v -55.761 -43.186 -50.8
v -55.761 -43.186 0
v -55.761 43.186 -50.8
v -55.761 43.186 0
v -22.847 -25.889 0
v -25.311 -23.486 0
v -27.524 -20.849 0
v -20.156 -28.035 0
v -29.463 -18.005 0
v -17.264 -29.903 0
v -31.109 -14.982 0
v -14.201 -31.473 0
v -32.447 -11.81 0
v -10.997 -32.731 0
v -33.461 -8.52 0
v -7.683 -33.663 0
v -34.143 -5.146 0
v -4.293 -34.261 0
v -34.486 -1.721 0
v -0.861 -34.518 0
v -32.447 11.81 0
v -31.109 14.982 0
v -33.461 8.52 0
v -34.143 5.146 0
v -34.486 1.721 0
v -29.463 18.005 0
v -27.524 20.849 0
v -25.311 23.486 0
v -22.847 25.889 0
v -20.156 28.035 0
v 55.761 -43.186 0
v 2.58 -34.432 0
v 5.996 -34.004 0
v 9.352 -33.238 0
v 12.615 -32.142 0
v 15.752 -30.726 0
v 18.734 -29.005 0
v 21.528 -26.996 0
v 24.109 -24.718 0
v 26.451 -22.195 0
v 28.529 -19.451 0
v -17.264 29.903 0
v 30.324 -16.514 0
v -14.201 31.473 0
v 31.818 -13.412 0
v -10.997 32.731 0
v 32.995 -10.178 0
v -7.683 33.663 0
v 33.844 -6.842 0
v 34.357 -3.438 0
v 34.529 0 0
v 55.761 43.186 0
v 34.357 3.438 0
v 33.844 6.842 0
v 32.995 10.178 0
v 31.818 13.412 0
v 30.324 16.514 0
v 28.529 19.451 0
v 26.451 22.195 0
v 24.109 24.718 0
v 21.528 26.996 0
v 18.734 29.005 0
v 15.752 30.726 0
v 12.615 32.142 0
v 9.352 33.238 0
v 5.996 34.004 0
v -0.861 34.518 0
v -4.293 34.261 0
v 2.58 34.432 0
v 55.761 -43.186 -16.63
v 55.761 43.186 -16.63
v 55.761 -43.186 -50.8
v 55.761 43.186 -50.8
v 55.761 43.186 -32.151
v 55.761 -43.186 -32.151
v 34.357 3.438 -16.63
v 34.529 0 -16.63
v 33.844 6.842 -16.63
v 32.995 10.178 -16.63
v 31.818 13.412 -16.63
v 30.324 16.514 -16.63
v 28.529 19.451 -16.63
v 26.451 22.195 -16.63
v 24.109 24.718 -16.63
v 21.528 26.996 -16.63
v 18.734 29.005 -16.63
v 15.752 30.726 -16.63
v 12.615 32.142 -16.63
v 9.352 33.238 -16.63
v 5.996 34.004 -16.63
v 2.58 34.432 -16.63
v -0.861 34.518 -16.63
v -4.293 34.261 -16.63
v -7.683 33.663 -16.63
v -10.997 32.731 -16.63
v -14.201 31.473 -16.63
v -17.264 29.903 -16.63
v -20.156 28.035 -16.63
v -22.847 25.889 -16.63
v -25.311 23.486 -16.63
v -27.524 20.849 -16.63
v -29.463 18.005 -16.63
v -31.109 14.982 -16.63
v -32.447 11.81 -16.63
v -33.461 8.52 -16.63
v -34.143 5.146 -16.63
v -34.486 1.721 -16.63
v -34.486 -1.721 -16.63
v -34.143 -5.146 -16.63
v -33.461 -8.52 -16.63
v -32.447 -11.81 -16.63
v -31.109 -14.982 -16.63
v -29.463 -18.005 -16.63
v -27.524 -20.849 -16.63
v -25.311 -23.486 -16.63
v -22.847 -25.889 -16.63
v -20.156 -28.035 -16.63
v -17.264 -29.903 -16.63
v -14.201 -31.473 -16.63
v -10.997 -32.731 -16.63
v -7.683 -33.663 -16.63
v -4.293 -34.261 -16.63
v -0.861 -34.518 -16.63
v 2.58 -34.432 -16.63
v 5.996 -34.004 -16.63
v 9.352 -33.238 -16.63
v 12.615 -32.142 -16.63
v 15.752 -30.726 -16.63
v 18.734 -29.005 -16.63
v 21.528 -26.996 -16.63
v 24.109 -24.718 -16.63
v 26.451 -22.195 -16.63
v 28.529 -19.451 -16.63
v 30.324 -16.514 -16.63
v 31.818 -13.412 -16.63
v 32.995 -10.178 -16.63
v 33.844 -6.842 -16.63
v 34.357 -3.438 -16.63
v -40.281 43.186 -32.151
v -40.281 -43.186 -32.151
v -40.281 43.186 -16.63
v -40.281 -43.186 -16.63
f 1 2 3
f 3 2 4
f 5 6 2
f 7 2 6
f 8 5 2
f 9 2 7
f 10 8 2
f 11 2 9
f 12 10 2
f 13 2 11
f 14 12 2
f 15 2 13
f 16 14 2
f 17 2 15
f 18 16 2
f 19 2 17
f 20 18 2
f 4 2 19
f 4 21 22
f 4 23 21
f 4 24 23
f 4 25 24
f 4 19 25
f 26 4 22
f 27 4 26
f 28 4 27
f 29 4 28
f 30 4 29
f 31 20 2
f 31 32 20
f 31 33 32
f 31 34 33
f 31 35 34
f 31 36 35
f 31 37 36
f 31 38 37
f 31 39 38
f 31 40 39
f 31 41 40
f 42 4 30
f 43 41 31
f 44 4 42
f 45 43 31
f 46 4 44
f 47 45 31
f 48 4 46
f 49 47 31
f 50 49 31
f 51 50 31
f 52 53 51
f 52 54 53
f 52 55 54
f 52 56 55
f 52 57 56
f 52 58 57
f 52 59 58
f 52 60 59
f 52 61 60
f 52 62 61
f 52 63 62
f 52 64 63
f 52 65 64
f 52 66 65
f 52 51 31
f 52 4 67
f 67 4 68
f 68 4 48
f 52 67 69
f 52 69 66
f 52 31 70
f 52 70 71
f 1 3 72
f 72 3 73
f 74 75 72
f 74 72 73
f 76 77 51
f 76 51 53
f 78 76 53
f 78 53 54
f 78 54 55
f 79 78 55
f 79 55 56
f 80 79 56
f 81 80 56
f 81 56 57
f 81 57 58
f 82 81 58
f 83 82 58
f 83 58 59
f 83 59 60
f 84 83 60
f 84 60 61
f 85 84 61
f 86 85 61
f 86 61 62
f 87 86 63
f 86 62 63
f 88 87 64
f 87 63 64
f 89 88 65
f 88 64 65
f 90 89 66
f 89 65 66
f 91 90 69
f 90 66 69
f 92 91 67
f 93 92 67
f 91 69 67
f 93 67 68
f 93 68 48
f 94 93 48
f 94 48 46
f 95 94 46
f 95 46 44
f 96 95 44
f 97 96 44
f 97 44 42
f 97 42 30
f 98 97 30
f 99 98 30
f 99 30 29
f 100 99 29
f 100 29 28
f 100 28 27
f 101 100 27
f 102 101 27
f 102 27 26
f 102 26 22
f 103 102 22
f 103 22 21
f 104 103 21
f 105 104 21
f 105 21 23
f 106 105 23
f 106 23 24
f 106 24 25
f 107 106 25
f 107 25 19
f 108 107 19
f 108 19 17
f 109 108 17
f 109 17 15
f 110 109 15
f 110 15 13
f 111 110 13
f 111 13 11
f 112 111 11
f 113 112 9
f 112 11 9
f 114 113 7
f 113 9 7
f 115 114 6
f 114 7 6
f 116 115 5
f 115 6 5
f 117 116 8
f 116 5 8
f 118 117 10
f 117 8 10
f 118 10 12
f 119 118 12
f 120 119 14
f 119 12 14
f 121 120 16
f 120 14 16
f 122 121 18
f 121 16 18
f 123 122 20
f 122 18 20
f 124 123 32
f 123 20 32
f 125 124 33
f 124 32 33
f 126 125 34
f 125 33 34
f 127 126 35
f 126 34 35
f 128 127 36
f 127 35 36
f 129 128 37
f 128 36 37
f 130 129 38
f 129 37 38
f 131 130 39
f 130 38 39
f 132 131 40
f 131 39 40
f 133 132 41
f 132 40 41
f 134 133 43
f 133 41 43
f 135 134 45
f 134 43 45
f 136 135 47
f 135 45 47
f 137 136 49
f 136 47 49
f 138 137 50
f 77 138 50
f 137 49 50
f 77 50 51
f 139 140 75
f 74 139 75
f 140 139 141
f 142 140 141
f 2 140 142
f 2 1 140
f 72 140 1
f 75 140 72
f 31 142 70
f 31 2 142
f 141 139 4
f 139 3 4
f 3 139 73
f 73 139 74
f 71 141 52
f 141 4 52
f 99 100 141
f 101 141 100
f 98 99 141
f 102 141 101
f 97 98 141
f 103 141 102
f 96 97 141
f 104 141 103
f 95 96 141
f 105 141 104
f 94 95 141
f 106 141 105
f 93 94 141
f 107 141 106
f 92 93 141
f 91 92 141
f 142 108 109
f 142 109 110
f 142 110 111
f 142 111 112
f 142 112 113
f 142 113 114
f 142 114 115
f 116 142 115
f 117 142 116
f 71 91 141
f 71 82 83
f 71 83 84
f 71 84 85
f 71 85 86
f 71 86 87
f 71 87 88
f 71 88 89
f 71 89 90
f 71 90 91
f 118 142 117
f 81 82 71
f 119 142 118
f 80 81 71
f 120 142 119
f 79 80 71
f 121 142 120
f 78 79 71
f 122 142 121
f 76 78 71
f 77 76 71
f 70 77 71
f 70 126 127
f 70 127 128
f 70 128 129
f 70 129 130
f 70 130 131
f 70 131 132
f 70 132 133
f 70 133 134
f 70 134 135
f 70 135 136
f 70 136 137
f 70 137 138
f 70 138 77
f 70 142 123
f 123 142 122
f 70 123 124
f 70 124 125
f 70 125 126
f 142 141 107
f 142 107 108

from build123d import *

# Parameters (mm, degrees)
F0_W     = 111.522756
F0_H     = 86.371966
F1_DEPTH = 50.8
F2_W     = 80.143302
F2_H     = 39.228082
F3_DEPTH = 36.405057
F4_W     = 96.042376
F4_H     = 15.521109
F5_DEPTH = 86.372966
F6_R     = 34.528896
F7_DEPTH = 25.4


with BuildPart() as f1:
    # F0 (on Top) → F1 (new body)
    with BuildSketch(Plane.XY):
        Rectangle(F0_W, F0_H)
    extrude(amount=-F1_DEPTH)

    # F2 (on face) → F3 (join)
    with BuildSketch(Plane.XZ.offset(43.185983)):
        with Locations((0, -31.185959)):
            Rectangle(F2_W, F2_H)
    extrude(amount=-F3_DEPTH)

    # F4 (on face) → F5 (cut, through all)
    with BuildSketch(Plane.XZ.offset(43.185983)):
        with Locations((7.74019, -24.390307)):
            Rectangle(F4_W, F4_H)
    extrude(amount=-F5_DEPTH, mode=Mode.SUBTRACT)

    # F6 (on face) → F7 (cut)
    with BuildSketch(Plane.XY):
        Circle(F6_R)
    extrude(amount=-F7_DEPTH, mode=Mode.SUBTRACT)


solid = f1.part
